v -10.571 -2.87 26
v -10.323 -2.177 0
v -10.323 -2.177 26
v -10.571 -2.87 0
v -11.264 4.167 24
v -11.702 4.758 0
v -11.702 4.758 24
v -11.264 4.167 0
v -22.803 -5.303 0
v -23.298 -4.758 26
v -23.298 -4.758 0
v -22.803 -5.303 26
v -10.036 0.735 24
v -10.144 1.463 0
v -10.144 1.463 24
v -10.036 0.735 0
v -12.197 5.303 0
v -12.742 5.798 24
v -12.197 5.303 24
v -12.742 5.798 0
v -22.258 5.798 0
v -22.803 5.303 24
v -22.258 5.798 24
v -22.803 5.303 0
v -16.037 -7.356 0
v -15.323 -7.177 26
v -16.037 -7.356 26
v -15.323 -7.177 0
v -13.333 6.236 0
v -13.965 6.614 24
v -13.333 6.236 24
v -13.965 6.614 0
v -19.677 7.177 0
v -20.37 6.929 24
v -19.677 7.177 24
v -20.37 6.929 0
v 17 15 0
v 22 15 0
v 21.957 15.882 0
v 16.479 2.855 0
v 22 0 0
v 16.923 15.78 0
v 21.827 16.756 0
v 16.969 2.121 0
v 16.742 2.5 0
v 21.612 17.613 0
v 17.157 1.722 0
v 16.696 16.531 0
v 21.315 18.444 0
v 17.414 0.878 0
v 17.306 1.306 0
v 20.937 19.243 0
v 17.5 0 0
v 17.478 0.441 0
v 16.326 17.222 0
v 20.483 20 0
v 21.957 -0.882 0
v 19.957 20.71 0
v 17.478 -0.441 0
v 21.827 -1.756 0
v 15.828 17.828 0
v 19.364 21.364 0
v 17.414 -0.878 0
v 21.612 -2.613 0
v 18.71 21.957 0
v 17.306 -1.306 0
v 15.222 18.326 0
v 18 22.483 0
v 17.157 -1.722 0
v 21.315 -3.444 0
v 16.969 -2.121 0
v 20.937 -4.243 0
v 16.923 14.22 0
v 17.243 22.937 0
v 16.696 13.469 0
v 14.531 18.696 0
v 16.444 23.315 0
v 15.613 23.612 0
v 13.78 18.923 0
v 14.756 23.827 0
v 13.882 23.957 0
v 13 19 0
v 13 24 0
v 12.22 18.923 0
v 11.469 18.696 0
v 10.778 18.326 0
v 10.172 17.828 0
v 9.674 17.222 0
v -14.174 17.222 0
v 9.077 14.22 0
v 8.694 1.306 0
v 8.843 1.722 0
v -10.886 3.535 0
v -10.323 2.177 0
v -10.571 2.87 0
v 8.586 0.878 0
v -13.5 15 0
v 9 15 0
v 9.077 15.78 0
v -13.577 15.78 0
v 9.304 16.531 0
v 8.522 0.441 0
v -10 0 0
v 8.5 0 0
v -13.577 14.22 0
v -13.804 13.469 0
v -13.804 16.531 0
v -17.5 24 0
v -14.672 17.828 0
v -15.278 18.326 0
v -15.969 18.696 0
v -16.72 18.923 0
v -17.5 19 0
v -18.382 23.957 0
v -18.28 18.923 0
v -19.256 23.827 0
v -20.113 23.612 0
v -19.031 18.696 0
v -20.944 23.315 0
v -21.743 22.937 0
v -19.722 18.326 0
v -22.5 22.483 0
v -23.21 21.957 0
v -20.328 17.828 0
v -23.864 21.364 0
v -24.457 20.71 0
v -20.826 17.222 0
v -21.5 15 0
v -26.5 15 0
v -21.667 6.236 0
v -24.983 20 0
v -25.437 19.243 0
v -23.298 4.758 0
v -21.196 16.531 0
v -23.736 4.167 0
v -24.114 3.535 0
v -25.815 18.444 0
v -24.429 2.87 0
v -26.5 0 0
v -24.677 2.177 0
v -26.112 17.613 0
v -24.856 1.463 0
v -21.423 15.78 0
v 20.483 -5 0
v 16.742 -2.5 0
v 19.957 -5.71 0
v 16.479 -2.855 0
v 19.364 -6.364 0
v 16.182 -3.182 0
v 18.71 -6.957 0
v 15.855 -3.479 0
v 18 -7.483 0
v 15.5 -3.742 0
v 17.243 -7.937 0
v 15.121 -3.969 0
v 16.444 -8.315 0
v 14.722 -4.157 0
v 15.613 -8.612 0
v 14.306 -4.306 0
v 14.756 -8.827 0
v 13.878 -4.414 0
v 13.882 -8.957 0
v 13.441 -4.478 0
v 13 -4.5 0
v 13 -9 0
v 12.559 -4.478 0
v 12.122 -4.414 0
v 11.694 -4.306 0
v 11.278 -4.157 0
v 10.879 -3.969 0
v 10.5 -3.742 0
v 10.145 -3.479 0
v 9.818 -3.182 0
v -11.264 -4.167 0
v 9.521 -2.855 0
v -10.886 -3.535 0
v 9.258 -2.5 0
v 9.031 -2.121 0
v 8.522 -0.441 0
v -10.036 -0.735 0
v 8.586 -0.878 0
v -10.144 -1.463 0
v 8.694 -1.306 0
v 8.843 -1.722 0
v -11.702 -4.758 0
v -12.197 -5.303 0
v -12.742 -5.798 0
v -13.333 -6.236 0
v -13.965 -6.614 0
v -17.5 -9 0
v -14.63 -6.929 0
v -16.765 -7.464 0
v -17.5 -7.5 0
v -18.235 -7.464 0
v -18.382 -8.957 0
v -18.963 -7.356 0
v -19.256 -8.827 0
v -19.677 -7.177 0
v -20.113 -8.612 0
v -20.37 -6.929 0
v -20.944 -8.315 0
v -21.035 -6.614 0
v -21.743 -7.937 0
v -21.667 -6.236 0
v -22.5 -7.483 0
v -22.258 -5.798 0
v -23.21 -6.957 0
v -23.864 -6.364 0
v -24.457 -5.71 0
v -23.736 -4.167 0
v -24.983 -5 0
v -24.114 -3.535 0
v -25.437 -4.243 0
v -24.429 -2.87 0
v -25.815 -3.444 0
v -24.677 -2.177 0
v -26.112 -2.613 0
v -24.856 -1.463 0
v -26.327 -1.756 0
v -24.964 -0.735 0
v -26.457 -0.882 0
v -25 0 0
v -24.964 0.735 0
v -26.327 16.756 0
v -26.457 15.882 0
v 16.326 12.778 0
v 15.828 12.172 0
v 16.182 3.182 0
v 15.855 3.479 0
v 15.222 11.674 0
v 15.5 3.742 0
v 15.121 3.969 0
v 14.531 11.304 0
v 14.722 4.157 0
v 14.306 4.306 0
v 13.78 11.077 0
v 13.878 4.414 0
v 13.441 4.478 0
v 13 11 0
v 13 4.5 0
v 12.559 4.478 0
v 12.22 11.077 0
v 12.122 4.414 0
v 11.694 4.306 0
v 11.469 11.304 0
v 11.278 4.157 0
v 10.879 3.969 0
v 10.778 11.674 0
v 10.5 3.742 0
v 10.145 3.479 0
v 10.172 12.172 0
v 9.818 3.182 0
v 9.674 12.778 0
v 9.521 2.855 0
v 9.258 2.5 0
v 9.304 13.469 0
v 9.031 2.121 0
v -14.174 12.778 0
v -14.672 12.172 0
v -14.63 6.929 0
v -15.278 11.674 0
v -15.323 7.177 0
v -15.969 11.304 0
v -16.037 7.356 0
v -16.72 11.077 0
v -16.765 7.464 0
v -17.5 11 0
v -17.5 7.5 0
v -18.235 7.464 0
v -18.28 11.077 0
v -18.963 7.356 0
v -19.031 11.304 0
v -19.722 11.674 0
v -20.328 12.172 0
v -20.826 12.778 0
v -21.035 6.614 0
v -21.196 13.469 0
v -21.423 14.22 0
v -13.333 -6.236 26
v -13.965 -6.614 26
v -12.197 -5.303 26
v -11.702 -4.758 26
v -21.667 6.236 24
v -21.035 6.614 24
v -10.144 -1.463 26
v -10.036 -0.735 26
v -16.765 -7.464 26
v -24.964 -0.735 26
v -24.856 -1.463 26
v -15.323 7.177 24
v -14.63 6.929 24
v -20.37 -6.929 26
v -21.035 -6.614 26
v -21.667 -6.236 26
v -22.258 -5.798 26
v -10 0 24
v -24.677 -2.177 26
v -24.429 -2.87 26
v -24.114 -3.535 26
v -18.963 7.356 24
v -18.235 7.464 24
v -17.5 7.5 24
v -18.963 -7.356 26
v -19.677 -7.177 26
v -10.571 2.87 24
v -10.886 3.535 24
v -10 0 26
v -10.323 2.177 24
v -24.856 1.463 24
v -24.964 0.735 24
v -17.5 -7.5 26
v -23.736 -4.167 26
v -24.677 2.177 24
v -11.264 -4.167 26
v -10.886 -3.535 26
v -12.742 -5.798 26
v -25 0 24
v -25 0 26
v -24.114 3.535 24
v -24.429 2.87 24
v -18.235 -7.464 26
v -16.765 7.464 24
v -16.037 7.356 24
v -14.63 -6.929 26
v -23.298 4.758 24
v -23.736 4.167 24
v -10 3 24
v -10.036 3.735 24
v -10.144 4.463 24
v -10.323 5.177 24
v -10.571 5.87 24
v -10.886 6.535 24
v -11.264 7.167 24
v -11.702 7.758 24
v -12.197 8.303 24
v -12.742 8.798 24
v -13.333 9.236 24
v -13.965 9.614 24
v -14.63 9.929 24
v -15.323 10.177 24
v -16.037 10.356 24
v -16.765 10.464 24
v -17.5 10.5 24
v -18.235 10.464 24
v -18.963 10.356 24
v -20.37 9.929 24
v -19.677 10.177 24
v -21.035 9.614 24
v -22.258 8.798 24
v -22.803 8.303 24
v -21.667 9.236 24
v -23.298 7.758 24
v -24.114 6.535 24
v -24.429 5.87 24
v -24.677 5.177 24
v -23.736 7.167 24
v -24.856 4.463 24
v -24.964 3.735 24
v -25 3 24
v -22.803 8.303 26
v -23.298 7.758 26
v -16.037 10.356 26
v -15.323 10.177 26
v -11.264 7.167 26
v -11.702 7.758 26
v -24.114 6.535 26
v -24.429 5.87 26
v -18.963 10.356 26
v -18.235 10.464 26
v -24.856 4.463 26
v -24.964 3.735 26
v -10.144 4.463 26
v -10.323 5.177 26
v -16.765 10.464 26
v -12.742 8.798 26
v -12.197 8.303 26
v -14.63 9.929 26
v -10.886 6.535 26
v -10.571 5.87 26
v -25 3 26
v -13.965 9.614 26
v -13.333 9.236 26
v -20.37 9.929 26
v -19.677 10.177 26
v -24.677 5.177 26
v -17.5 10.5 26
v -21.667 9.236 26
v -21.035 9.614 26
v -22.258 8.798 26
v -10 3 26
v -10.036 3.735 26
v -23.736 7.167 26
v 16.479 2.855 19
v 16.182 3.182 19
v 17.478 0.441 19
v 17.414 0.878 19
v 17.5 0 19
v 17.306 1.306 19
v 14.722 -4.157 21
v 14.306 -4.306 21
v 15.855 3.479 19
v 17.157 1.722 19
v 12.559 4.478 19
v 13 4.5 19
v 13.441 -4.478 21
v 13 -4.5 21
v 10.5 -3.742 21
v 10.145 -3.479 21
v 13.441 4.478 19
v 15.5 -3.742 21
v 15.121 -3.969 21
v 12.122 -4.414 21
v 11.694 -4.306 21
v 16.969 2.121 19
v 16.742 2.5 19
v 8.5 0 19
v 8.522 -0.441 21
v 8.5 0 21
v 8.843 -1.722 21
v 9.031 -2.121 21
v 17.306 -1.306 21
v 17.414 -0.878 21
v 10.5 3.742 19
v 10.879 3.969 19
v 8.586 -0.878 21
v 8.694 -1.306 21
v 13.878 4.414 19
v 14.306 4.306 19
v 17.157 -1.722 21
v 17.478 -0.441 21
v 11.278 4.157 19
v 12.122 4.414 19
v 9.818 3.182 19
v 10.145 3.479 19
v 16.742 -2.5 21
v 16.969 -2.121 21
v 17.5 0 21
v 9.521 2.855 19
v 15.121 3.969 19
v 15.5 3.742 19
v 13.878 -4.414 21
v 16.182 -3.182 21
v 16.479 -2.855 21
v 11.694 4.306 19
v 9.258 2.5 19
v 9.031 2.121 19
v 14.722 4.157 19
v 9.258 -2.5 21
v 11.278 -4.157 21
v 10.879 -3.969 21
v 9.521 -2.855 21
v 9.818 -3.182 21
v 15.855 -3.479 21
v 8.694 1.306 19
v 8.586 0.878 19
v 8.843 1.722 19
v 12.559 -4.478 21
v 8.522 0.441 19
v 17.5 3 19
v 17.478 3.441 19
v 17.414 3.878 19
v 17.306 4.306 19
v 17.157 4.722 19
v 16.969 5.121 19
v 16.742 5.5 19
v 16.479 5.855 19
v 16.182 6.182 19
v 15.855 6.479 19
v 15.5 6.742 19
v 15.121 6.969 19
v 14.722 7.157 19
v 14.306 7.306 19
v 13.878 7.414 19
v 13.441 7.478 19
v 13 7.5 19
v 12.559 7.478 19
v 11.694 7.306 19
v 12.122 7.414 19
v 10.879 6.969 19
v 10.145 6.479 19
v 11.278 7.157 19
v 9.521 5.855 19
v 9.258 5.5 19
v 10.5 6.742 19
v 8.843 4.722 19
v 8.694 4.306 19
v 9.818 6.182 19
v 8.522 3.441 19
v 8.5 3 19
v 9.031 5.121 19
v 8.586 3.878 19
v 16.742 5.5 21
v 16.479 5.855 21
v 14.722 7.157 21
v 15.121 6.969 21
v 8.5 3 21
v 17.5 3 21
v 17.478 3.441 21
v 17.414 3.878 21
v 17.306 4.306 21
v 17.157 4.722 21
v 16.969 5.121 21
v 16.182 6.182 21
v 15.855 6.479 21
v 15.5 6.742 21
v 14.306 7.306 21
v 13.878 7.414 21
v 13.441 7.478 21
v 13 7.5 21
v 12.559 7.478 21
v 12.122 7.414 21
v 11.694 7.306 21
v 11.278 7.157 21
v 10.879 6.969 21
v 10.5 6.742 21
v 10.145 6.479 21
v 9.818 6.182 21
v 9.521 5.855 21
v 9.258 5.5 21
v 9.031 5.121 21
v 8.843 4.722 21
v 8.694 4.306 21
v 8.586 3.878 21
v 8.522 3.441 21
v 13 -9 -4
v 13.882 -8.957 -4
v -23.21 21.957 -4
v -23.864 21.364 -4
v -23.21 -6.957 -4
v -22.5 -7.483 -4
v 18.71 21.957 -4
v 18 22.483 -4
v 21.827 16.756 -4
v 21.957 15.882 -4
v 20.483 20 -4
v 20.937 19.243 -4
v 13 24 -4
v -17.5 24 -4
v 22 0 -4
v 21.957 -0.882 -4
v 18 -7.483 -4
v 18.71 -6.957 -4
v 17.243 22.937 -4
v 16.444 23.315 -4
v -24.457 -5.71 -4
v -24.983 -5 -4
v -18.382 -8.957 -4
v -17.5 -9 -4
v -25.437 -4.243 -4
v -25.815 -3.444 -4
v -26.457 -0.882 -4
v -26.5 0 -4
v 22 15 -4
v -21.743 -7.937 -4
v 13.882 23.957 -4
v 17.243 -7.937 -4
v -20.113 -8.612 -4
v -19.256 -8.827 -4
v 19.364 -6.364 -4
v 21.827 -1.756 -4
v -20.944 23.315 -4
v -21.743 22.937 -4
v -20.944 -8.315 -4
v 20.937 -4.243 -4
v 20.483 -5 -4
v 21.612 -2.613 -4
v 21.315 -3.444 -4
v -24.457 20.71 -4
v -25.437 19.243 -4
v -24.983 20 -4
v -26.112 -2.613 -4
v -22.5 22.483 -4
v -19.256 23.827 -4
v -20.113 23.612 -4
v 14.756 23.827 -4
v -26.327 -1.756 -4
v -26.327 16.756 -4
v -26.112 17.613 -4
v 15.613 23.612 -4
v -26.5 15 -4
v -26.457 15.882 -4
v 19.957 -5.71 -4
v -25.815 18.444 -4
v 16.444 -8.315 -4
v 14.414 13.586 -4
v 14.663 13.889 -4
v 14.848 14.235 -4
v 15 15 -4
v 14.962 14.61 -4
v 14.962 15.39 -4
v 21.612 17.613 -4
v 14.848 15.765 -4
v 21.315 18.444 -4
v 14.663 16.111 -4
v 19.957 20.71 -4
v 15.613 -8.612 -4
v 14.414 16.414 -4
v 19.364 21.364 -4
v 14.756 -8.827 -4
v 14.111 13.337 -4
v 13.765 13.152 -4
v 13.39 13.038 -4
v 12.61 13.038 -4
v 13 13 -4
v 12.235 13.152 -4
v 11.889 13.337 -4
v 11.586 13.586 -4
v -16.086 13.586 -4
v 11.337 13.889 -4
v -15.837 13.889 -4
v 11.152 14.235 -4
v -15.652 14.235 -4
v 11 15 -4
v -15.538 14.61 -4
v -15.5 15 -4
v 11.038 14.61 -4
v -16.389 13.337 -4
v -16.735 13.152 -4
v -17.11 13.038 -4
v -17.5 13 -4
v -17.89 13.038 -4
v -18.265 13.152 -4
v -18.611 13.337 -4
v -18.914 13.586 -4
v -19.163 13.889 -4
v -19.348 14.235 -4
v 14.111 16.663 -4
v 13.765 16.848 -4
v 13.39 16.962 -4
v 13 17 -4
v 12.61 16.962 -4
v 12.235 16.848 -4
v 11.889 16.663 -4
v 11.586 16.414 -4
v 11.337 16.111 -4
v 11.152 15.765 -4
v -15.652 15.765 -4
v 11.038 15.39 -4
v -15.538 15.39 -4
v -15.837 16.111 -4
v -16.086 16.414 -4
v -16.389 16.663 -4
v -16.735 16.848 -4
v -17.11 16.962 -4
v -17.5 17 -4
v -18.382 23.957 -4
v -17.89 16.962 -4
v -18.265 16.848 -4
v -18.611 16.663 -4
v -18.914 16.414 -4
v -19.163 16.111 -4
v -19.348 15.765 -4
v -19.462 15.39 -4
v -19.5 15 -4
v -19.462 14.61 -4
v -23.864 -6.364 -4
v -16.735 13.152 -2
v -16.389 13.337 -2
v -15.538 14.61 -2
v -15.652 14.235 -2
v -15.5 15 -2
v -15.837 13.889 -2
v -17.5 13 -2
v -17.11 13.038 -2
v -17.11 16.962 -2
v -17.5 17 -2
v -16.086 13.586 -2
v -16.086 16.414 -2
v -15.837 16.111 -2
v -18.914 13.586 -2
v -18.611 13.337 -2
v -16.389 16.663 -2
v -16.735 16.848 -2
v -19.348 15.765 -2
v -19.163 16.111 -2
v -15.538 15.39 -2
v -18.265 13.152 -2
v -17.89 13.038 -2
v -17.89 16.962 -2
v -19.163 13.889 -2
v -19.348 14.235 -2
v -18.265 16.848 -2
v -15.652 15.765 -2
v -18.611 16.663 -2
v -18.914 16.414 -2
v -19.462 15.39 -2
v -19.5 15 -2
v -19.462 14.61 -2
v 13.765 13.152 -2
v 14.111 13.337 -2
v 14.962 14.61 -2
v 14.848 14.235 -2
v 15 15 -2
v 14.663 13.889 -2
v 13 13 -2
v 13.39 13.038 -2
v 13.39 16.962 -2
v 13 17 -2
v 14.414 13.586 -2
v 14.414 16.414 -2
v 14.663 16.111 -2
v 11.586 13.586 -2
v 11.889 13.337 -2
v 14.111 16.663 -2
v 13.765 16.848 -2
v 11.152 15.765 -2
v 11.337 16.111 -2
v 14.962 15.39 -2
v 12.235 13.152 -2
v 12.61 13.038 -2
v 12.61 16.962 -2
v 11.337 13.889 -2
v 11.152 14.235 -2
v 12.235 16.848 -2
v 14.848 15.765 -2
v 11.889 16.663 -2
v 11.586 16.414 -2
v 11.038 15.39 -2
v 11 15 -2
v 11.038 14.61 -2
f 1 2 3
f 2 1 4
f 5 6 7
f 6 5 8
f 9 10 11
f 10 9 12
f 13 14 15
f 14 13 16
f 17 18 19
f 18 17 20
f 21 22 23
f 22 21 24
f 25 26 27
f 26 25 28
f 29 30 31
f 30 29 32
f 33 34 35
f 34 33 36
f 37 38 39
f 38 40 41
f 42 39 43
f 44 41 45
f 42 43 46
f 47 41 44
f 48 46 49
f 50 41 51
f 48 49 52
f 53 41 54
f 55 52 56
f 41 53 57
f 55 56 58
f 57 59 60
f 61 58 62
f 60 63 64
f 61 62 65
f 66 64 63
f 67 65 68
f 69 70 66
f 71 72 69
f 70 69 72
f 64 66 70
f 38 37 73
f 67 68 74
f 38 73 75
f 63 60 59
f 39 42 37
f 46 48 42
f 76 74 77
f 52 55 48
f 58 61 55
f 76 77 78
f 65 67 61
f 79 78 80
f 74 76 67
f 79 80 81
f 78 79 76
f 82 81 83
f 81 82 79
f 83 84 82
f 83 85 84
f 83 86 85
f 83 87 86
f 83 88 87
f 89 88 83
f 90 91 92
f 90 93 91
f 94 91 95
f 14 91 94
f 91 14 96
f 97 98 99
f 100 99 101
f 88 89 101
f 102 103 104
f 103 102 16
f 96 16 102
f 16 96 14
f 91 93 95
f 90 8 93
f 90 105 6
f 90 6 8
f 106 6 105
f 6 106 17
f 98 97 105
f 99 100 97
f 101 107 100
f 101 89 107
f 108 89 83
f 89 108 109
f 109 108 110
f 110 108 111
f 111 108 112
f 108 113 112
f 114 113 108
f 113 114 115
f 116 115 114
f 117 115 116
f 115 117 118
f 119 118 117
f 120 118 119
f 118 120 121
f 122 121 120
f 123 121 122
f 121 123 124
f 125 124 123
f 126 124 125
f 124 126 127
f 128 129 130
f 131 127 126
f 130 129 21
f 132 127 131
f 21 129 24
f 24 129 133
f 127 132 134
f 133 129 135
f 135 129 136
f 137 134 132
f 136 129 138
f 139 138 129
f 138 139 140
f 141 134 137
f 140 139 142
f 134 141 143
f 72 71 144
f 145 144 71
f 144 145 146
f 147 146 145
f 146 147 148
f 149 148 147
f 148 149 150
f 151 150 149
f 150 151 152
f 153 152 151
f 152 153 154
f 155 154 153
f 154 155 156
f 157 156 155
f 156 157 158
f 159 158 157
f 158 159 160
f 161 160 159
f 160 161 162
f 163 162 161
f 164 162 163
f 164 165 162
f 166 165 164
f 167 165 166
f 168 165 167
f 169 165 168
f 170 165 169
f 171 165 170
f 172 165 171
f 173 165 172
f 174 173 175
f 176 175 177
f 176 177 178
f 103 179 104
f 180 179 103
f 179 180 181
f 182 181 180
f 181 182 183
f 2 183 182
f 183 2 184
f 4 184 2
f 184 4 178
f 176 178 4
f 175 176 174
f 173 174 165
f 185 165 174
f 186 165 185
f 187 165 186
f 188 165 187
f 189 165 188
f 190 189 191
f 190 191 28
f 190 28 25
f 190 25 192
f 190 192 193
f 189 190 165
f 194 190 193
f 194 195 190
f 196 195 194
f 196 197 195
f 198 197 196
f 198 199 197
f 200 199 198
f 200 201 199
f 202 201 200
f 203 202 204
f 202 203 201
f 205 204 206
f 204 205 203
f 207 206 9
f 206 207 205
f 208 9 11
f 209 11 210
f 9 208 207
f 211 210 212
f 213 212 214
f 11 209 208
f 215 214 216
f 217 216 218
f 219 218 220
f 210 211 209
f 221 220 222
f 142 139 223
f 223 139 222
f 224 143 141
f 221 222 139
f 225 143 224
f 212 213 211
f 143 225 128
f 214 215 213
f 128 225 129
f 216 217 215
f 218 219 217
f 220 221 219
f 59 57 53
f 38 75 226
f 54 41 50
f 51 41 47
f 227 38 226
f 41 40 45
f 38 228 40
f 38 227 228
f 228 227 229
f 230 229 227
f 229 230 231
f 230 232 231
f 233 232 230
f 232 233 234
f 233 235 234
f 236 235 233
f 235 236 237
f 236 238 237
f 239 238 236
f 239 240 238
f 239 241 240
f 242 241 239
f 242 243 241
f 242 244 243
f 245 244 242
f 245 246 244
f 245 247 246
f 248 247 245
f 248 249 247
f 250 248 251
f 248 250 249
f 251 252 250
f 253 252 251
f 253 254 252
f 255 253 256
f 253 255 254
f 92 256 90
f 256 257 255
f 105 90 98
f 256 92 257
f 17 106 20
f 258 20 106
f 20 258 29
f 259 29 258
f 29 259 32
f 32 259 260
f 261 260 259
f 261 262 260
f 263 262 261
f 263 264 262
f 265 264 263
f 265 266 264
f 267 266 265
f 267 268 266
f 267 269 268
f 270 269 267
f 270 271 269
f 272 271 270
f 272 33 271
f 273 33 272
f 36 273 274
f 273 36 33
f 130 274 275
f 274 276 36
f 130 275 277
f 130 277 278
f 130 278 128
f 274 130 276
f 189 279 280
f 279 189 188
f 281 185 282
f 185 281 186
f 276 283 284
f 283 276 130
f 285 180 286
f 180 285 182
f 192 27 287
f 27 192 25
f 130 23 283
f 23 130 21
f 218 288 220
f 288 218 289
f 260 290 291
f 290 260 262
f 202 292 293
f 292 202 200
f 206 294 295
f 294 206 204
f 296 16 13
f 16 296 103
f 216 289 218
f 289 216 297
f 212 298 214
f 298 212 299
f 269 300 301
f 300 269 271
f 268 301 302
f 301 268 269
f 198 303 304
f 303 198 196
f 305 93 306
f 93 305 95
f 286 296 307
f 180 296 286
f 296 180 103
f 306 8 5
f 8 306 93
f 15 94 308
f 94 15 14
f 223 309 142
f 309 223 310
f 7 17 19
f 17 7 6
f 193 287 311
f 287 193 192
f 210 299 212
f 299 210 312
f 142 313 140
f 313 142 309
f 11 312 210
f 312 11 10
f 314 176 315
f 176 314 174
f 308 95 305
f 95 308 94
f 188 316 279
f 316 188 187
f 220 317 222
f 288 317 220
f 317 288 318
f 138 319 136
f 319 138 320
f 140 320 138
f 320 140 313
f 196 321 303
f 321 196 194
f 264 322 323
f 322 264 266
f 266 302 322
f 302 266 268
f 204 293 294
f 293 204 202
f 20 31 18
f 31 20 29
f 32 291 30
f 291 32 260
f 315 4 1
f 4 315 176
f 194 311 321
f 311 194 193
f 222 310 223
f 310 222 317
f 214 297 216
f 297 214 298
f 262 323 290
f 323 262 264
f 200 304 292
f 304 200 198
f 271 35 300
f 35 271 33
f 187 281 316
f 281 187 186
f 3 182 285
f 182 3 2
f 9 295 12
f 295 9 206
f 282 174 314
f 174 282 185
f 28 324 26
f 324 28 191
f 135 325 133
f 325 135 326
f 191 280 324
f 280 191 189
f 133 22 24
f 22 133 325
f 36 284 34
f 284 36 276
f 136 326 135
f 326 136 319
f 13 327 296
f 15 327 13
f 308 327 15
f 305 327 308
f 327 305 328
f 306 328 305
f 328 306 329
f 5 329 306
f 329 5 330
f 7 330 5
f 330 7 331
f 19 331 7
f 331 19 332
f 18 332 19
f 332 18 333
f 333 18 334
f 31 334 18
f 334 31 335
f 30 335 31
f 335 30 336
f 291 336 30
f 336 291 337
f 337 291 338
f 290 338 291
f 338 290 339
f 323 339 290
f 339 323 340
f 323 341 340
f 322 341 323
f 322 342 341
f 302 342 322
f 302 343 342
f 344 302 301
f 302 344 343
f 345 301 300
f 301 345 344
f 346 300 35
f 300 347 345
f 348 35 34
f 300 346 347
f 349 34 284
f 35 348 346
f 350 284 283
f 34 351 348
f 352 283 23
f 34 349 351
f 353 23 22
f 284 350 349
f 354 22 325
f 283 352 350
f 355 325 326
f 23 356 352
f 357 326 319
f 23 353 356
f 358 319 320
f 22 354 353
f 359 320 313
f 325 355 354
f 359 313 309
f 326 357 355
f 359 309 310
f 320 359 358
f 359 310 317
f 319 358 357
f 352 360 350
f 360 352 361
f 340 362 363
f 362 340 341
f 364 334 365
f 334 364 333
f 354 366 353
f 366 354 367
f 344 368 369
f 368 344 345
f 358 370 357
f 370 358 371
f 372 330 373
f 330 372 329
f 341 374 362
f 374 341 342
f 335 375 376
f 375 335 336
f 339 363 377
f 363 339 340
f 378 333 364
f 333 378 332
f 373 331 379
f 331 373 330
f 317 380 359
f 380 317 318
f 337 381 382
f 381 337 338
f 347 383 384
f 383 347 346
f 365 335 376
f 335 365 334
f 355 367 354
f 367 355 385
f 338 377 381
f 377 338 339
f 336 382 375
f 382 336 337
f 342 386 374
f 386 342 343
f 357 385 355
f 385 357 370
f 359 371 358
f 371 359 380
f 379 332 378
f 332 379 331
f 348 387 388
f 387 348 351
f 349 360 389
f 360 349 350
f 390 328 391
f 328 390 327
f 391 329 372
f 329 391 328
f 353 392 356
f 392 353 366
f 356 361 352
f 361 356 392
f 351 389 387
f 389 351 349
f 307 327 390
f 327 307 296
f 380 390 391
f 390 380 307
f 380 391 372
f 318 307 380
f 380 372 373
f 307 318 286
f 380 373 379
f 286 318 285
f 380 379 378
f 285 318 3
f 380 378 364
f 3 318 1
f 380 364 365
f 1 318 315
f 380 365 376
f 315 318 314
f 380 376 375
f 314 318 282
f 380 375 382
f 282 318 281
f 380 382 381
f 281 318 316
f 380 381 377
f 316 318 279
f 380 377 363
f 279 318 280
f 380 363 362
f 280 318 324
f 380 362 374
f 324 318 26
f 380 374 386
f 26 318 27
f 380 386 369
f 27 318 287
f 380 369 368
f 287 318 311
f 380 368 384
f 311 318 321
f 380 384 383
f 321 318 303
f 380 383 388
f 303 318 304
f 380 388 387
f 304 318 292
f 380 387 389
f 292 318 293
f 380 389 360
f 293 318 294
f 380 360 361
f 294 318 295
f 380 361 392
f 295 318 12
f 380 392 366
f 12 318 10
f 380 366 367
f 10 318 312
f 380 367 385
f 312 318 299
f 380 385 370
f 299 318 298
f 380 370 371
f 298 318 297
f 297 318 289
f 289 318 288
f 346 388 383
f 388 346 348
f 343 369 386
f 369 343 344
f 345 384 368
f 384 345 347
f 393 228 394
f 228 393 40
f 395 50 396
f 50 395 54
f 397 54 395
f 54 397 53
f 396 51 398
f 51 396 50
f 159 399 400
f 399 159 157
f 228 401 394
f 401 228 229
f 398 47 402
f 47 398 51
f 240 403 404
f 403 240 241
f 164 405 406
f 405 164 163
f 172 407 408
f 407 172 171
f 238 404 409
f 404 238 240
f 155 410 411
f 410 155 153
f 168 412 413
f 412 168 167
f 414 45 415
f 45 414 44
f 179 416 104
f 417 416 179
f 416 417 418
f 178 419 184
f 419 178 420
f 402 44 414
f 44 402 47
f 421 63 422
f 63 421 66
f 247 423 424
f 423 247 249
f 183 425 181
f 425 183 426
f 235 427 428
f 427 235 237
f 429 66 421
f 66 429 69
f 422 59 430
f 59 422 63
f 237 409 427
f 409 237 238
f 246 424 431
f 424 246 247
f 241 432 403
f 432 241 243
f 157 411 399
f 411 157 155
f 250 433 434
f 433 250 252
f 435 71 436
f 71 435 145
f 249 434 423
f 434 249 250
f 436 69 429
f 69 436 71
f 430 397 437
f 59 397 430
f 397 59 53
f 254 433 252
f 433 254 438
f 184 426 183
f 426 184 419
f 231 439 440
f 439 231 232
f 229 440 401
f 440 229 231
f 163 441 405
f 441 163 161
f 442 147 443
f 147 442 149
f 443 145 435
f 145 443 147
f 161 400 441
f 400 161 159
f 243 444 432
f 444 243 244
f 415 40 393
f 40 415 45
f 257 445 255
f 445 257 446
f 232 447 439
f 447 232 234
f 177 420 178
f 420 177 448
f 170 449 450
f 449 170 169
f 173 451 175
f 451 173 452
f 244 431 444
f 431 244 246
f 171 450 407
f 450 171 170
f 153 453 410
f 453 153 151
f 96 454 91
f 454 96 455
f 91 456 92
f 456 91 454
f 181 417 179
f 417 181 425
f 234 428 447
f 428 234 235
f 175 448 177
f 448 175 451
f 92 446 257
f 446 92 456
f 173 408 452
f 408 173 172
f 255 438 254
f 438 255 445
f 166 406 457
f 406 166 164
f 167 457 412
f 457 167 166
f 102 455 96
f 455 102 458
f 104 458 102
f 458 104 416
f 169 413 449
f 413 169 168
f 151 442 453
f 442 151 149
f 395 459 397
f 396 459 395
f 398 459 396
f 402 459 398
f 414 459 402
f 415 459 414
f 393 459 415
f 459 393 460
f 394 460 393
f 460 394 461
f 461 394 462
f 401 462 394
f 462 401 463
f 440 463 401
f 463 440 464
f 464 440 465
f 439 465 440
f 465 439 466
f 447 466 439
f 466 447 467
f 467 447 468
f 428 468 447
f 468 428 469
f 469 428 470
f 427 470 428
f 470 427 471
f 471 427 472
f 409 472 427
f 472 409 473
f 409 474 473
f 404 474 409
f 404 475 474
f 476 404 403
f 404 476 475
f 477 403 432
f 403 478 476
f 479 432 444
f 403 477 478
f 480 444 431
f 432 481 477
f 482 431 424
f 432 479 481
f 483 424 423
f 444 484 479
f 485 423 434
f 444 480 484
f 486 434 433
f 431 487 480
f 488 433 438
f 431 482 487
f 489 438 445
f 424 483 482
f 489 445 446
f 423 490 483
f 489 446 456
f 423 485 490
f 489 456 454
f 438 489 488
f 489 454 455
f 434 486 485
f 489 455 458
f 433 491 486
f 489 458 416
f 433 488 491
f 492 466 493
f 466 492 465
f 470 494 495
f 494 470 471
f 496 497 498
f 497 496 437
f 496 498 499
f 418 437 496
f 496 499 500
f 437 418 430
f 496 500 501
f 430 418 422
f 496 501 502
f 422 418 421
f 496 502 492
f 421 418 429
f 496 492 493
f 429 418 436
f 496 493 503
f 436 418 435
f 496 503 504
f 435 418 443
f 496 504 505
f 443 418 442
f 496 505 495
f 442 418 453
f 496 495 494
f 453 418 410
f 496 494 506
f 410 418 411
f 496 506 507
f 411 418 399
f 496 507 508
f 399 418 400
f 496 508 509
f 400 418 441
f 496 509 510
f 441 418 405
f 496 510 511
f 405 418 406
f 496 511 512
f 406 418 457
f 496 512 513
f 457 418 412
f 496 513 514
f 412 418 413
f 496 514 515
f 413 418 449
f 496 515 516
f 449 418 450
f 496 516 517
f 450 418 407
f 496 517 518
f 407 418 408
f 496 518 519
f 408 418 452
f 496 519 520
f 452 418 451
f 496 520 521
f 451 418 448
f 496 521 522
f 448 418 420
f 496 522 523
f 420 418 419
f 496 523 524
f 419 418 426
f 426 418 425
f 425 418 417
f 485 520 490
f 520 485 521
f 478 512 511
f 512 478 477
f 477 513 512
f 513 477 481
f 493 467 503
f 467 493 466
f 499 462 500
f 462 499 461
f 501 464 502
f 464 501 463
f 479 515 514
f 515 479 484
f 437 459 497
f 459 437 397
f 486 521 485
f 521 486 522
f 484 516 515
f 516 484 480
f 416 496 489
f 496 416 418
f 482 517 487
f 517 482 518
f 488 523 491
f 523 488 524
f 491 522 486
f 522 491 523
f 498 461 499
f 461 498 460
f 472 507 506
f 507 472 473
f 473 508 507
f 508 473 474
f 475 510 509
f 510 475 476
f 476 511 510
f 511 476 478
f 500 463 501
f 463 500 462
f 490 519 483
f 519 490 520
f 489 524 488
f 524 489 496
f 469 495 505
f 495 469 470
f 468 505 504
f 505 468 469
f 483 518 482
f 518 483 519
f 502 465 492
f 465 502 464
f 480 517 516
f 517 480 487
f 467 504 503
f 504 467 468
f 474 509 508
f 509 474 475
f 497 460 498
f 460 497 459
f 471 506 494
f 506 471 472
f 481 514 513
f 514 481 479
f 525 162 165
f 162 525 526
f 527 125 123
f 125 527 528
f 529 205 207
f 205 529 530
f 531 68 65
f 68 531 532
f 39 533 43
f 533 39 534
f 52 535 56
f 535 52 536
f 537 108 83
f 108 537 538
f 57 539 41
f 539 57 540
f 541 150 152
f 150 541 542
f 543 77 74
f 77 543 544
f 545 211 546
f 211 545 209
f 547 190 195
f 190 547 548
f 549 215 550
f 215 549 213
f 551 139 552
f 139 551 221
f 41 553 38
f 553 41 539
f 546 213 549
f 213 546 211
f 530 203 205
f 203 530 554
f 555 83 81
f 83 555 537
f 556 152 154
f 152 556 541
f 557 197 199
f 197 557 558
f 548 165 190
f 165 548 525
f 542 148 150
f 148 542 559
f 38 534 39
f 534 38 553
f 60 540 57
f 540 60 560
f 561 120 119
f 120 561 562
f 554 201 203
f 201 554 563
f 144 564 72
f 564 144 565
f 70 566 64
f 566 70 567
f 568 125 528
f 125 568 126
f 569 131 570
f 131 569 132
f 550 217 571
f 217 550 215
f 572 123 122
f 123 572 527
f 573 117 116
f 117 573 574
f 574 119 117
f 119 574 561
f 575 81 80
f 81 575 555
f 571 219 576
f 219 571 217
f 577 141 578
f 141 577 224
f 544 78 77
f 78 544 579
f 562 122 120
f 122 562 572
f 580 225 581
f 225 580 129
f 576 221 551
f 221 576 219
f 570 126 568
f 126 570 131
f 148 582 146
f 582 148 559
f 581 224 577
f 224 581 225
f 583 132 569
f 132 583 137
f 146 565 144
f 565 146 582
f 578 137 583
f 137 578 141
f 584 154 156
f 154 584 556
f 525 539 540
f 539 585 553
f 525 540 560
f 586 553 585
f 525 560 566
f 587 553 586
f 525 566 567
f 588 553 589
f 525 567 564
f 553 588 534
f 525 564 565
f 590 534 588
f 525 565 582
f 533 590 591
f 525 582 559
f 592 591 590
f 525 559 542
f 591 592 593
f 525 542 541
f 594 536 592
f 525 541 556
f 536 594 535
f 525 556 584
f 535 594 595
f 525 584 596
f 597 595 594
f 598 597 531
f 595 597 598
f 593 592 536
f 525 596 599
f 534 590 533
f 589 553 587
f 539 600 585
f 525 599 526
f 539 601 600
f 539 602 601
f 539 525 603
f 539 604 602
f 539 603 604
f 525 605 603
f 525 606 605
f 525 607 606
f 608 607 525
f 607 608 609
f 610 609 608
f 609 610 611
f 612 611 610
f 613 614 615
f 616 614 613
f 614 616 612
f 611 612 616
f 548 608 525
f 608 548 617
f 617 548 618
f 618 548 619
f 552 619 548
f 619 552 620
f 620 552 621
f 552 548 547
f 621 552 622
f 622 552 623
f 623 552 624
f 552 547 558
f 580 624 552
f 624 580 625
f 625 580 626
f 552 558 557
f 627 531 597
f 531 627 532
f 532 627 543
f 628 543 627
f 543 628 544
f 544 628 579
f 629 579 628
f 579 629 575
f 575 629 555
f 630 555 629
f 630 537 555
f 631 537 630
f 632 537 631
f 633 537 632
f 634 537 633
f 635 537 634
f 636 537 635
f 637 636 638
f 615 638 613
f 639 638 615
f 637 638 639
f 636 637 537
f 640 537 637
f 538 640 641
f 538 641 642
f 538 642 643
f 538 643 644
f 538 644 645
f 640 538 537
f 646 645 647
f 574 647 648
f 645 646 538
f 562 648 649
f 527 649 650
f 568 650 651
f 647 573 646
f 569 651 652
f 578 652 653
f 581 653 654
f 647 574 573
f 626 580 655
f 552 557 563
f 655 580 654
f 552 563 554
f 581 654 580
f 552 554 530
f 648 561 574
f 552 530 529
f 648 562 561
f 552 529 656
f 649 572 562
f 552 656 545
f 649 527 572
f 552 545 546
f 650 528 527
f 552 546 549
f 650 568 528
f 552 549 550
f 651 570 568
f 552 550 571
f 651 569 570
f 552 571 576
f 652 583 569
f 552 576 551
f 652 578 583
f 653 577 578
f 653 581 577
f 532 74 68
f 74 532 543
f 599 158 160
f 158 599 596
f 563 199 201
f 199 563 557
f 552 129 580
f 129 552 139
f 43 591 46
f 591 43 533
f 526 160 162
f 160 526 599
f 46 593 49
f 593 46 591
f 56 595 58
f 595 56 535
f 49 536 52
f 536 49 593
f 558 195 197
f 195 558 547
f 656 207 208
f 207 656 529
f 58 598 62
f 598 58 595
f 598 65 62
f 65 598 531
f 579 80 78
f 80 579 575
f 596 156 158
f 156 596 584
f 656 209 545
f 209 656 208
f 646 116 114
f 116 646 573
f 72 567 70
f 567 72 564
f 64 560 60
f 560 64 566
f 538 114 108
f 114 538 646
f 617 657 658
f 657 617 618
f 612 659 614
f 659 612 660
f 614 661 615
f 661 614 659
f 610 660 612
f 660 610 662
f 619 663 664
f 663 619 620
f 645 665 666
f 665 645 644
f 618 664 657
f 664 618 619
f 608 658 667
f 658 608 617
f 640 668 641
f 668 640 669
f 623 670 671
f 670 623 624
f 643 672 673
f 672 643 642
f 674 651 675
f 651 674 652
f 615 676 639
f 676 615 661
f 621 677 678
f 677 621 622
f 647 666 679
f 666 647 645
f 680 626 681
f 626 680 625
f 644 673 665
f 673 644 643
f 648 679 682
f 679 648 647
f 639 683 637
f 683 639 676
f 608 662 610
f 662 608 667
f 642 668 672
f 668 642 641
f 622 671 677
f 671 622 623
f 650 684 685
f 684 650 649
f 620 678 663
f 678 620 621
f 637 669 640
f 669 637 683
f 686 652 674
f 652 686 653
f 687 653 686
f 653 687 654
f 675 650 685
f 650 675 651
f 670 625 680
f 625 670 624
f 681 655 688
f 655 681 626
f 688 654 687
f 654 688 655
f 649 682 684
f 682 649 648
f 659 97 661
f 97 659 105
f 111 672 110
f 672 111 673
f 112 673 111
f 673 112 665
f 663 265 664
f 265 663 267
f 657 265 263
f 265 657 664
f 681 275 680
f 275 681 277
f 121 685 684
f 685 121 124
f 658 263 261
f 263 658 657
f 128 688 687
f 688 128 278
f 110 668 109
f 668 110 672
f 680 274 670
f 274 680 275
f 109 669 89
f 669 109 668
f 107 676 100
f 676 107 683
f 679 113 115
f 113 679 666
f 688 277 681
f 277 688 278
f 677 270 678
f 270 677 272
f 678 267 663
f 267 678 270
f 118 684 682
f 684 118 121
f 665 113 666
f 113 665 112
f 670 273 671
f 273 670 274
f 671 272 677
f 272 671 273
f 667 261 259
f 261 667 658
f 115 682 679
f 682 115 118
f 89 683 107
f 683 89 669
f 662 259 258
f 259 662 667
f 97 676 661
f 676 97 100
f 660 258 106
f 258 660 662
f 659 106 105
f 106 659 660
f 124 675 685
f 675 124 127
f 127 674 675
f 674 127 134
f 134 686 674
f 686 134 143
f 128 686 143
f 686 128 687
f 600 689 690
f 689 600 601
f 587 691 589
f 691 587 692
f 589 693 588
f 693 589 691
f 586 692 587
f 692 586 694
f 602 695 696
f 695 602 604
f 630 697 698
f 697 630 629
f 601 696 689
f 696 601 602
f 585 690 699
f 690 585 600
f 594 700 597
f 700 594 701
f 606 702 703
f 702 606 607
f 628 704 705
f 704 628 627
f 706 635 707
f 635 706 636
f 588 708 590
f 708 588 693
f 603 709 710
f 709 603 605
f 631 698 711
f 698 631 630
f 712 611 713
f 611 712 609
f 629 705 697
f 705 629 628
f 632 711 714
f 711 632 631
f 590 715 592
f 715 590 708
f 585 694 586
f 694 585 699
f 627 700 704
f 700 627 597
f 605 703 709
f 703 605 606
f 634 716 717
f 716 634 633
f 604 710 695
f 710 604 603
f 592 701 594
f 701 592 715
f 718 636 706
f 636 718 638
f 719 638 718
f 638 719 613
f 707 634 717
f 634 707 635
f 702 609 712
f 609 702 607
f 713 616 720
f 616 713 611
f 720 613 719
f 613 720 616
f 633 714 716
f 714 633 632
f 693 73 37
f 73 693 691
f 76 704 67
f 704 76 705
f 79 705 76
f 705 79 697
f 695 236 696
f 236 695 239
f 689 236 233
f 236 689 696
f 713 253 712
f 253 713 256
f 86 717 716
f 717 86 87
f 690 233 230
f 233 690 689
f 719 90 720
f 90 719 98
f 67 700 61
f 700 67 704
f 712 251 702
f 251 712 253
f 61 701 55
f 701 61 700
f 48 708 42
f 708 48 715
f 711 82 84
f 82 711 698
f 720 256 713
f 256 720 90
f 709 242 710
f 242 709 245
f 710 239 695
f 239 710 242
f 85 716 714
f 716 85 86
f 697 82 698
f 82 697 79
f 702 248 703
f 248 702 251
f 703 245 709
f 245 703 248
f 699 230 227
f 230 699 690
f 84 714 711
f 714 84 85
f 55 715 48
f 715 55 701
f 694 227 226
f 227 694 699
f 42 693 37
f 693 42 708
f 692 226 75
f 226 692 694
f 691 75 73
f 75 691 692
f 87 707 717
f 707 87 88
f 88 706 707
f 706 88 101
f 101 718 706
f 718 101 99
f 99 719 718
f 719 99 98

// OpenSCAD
// file: ../../lib/screew.scad
//screew();

module screew(r=4, len=20, hole_len=4) {
	color("yellow") {
		cylinder(len, r/2, r/2, $fn=32);
		cylinder(r, r*2/2, 0, $fn=32);
		translate([0,0,-hole_len])
			cylinder(hole_len, r*2/2, r*2/2, $fn=32);
	}
}
// main file
include <../../lib/screew.scad>;


//tournevis_facom_T30();
clef_cliquet_facom();

module clef_cliquet_facom() {
	x1=-35/2;
	x2= 26/2;
	difference() {
		union() {
			translate([x1,0,0]) {
				r = 19;
				h = 22+2; //22
				cylinder(h,(r-4)/2,(r-4)/2,$fn=64);
				translate([0,0,h])
					hull() {
						cylinder(2,(r-4)/2,(r-4)/2,$fn=64);
						translate([0,3,0])
							cylinder(2,(r-4)/2,(r-4)/2,$fn=64);
					}
			}
			translate([x2,0,0]) {
				r = 13;
				h = 17+2; 
				cylinder(h,(r-4)/2,(r-4)/2,$fn=64);
				translate([0,0,h])
					hull() {
						cylinder(2,(r-4)/2,(r-4)/2,$fn=64);
						translate([0,3,0])
							cylinder(2,(r-4)/2,(r-4)/2,$fn=64);
					}
			}
			hull() {
				r=18;
				translate([x1, 0,-4]) cylinder(4,r/2,r/2,$fn=64);
				translate([x1,15,-4]) cylinder(4,r/2,r/2,$fn=64);
				translate([x2,15,-4]) cylinder(4,r/2,r/2,$fn=64);
				translate([x2, 0,-4]) cylinder(4,r/2,r/2,$fn=64);
			} 
		}
		translate([x1,15,0])
			rotate([180,0,0])
				screew();
		translate([x2,15,0])
			rotate([180,0,0])
				screew();
	}
	
}

module tournevis_facom_T30() {
	d=21;
	h=15;
	ep_y = 8;
	ep_x = 2;
	ep_griffe = 4;
	difference() {
		cube([d+ep_x*2,d+ep_y*2,h], center=true);
		cylinder(h+10, d/2,d/2, $fn=32, center = true);
		translate([-20,-40-ep_griffe,-20])
			cube(40);
		translate([0,d/2+1,0])
			rotate([-90,0,0])
				screew();
	}
}
